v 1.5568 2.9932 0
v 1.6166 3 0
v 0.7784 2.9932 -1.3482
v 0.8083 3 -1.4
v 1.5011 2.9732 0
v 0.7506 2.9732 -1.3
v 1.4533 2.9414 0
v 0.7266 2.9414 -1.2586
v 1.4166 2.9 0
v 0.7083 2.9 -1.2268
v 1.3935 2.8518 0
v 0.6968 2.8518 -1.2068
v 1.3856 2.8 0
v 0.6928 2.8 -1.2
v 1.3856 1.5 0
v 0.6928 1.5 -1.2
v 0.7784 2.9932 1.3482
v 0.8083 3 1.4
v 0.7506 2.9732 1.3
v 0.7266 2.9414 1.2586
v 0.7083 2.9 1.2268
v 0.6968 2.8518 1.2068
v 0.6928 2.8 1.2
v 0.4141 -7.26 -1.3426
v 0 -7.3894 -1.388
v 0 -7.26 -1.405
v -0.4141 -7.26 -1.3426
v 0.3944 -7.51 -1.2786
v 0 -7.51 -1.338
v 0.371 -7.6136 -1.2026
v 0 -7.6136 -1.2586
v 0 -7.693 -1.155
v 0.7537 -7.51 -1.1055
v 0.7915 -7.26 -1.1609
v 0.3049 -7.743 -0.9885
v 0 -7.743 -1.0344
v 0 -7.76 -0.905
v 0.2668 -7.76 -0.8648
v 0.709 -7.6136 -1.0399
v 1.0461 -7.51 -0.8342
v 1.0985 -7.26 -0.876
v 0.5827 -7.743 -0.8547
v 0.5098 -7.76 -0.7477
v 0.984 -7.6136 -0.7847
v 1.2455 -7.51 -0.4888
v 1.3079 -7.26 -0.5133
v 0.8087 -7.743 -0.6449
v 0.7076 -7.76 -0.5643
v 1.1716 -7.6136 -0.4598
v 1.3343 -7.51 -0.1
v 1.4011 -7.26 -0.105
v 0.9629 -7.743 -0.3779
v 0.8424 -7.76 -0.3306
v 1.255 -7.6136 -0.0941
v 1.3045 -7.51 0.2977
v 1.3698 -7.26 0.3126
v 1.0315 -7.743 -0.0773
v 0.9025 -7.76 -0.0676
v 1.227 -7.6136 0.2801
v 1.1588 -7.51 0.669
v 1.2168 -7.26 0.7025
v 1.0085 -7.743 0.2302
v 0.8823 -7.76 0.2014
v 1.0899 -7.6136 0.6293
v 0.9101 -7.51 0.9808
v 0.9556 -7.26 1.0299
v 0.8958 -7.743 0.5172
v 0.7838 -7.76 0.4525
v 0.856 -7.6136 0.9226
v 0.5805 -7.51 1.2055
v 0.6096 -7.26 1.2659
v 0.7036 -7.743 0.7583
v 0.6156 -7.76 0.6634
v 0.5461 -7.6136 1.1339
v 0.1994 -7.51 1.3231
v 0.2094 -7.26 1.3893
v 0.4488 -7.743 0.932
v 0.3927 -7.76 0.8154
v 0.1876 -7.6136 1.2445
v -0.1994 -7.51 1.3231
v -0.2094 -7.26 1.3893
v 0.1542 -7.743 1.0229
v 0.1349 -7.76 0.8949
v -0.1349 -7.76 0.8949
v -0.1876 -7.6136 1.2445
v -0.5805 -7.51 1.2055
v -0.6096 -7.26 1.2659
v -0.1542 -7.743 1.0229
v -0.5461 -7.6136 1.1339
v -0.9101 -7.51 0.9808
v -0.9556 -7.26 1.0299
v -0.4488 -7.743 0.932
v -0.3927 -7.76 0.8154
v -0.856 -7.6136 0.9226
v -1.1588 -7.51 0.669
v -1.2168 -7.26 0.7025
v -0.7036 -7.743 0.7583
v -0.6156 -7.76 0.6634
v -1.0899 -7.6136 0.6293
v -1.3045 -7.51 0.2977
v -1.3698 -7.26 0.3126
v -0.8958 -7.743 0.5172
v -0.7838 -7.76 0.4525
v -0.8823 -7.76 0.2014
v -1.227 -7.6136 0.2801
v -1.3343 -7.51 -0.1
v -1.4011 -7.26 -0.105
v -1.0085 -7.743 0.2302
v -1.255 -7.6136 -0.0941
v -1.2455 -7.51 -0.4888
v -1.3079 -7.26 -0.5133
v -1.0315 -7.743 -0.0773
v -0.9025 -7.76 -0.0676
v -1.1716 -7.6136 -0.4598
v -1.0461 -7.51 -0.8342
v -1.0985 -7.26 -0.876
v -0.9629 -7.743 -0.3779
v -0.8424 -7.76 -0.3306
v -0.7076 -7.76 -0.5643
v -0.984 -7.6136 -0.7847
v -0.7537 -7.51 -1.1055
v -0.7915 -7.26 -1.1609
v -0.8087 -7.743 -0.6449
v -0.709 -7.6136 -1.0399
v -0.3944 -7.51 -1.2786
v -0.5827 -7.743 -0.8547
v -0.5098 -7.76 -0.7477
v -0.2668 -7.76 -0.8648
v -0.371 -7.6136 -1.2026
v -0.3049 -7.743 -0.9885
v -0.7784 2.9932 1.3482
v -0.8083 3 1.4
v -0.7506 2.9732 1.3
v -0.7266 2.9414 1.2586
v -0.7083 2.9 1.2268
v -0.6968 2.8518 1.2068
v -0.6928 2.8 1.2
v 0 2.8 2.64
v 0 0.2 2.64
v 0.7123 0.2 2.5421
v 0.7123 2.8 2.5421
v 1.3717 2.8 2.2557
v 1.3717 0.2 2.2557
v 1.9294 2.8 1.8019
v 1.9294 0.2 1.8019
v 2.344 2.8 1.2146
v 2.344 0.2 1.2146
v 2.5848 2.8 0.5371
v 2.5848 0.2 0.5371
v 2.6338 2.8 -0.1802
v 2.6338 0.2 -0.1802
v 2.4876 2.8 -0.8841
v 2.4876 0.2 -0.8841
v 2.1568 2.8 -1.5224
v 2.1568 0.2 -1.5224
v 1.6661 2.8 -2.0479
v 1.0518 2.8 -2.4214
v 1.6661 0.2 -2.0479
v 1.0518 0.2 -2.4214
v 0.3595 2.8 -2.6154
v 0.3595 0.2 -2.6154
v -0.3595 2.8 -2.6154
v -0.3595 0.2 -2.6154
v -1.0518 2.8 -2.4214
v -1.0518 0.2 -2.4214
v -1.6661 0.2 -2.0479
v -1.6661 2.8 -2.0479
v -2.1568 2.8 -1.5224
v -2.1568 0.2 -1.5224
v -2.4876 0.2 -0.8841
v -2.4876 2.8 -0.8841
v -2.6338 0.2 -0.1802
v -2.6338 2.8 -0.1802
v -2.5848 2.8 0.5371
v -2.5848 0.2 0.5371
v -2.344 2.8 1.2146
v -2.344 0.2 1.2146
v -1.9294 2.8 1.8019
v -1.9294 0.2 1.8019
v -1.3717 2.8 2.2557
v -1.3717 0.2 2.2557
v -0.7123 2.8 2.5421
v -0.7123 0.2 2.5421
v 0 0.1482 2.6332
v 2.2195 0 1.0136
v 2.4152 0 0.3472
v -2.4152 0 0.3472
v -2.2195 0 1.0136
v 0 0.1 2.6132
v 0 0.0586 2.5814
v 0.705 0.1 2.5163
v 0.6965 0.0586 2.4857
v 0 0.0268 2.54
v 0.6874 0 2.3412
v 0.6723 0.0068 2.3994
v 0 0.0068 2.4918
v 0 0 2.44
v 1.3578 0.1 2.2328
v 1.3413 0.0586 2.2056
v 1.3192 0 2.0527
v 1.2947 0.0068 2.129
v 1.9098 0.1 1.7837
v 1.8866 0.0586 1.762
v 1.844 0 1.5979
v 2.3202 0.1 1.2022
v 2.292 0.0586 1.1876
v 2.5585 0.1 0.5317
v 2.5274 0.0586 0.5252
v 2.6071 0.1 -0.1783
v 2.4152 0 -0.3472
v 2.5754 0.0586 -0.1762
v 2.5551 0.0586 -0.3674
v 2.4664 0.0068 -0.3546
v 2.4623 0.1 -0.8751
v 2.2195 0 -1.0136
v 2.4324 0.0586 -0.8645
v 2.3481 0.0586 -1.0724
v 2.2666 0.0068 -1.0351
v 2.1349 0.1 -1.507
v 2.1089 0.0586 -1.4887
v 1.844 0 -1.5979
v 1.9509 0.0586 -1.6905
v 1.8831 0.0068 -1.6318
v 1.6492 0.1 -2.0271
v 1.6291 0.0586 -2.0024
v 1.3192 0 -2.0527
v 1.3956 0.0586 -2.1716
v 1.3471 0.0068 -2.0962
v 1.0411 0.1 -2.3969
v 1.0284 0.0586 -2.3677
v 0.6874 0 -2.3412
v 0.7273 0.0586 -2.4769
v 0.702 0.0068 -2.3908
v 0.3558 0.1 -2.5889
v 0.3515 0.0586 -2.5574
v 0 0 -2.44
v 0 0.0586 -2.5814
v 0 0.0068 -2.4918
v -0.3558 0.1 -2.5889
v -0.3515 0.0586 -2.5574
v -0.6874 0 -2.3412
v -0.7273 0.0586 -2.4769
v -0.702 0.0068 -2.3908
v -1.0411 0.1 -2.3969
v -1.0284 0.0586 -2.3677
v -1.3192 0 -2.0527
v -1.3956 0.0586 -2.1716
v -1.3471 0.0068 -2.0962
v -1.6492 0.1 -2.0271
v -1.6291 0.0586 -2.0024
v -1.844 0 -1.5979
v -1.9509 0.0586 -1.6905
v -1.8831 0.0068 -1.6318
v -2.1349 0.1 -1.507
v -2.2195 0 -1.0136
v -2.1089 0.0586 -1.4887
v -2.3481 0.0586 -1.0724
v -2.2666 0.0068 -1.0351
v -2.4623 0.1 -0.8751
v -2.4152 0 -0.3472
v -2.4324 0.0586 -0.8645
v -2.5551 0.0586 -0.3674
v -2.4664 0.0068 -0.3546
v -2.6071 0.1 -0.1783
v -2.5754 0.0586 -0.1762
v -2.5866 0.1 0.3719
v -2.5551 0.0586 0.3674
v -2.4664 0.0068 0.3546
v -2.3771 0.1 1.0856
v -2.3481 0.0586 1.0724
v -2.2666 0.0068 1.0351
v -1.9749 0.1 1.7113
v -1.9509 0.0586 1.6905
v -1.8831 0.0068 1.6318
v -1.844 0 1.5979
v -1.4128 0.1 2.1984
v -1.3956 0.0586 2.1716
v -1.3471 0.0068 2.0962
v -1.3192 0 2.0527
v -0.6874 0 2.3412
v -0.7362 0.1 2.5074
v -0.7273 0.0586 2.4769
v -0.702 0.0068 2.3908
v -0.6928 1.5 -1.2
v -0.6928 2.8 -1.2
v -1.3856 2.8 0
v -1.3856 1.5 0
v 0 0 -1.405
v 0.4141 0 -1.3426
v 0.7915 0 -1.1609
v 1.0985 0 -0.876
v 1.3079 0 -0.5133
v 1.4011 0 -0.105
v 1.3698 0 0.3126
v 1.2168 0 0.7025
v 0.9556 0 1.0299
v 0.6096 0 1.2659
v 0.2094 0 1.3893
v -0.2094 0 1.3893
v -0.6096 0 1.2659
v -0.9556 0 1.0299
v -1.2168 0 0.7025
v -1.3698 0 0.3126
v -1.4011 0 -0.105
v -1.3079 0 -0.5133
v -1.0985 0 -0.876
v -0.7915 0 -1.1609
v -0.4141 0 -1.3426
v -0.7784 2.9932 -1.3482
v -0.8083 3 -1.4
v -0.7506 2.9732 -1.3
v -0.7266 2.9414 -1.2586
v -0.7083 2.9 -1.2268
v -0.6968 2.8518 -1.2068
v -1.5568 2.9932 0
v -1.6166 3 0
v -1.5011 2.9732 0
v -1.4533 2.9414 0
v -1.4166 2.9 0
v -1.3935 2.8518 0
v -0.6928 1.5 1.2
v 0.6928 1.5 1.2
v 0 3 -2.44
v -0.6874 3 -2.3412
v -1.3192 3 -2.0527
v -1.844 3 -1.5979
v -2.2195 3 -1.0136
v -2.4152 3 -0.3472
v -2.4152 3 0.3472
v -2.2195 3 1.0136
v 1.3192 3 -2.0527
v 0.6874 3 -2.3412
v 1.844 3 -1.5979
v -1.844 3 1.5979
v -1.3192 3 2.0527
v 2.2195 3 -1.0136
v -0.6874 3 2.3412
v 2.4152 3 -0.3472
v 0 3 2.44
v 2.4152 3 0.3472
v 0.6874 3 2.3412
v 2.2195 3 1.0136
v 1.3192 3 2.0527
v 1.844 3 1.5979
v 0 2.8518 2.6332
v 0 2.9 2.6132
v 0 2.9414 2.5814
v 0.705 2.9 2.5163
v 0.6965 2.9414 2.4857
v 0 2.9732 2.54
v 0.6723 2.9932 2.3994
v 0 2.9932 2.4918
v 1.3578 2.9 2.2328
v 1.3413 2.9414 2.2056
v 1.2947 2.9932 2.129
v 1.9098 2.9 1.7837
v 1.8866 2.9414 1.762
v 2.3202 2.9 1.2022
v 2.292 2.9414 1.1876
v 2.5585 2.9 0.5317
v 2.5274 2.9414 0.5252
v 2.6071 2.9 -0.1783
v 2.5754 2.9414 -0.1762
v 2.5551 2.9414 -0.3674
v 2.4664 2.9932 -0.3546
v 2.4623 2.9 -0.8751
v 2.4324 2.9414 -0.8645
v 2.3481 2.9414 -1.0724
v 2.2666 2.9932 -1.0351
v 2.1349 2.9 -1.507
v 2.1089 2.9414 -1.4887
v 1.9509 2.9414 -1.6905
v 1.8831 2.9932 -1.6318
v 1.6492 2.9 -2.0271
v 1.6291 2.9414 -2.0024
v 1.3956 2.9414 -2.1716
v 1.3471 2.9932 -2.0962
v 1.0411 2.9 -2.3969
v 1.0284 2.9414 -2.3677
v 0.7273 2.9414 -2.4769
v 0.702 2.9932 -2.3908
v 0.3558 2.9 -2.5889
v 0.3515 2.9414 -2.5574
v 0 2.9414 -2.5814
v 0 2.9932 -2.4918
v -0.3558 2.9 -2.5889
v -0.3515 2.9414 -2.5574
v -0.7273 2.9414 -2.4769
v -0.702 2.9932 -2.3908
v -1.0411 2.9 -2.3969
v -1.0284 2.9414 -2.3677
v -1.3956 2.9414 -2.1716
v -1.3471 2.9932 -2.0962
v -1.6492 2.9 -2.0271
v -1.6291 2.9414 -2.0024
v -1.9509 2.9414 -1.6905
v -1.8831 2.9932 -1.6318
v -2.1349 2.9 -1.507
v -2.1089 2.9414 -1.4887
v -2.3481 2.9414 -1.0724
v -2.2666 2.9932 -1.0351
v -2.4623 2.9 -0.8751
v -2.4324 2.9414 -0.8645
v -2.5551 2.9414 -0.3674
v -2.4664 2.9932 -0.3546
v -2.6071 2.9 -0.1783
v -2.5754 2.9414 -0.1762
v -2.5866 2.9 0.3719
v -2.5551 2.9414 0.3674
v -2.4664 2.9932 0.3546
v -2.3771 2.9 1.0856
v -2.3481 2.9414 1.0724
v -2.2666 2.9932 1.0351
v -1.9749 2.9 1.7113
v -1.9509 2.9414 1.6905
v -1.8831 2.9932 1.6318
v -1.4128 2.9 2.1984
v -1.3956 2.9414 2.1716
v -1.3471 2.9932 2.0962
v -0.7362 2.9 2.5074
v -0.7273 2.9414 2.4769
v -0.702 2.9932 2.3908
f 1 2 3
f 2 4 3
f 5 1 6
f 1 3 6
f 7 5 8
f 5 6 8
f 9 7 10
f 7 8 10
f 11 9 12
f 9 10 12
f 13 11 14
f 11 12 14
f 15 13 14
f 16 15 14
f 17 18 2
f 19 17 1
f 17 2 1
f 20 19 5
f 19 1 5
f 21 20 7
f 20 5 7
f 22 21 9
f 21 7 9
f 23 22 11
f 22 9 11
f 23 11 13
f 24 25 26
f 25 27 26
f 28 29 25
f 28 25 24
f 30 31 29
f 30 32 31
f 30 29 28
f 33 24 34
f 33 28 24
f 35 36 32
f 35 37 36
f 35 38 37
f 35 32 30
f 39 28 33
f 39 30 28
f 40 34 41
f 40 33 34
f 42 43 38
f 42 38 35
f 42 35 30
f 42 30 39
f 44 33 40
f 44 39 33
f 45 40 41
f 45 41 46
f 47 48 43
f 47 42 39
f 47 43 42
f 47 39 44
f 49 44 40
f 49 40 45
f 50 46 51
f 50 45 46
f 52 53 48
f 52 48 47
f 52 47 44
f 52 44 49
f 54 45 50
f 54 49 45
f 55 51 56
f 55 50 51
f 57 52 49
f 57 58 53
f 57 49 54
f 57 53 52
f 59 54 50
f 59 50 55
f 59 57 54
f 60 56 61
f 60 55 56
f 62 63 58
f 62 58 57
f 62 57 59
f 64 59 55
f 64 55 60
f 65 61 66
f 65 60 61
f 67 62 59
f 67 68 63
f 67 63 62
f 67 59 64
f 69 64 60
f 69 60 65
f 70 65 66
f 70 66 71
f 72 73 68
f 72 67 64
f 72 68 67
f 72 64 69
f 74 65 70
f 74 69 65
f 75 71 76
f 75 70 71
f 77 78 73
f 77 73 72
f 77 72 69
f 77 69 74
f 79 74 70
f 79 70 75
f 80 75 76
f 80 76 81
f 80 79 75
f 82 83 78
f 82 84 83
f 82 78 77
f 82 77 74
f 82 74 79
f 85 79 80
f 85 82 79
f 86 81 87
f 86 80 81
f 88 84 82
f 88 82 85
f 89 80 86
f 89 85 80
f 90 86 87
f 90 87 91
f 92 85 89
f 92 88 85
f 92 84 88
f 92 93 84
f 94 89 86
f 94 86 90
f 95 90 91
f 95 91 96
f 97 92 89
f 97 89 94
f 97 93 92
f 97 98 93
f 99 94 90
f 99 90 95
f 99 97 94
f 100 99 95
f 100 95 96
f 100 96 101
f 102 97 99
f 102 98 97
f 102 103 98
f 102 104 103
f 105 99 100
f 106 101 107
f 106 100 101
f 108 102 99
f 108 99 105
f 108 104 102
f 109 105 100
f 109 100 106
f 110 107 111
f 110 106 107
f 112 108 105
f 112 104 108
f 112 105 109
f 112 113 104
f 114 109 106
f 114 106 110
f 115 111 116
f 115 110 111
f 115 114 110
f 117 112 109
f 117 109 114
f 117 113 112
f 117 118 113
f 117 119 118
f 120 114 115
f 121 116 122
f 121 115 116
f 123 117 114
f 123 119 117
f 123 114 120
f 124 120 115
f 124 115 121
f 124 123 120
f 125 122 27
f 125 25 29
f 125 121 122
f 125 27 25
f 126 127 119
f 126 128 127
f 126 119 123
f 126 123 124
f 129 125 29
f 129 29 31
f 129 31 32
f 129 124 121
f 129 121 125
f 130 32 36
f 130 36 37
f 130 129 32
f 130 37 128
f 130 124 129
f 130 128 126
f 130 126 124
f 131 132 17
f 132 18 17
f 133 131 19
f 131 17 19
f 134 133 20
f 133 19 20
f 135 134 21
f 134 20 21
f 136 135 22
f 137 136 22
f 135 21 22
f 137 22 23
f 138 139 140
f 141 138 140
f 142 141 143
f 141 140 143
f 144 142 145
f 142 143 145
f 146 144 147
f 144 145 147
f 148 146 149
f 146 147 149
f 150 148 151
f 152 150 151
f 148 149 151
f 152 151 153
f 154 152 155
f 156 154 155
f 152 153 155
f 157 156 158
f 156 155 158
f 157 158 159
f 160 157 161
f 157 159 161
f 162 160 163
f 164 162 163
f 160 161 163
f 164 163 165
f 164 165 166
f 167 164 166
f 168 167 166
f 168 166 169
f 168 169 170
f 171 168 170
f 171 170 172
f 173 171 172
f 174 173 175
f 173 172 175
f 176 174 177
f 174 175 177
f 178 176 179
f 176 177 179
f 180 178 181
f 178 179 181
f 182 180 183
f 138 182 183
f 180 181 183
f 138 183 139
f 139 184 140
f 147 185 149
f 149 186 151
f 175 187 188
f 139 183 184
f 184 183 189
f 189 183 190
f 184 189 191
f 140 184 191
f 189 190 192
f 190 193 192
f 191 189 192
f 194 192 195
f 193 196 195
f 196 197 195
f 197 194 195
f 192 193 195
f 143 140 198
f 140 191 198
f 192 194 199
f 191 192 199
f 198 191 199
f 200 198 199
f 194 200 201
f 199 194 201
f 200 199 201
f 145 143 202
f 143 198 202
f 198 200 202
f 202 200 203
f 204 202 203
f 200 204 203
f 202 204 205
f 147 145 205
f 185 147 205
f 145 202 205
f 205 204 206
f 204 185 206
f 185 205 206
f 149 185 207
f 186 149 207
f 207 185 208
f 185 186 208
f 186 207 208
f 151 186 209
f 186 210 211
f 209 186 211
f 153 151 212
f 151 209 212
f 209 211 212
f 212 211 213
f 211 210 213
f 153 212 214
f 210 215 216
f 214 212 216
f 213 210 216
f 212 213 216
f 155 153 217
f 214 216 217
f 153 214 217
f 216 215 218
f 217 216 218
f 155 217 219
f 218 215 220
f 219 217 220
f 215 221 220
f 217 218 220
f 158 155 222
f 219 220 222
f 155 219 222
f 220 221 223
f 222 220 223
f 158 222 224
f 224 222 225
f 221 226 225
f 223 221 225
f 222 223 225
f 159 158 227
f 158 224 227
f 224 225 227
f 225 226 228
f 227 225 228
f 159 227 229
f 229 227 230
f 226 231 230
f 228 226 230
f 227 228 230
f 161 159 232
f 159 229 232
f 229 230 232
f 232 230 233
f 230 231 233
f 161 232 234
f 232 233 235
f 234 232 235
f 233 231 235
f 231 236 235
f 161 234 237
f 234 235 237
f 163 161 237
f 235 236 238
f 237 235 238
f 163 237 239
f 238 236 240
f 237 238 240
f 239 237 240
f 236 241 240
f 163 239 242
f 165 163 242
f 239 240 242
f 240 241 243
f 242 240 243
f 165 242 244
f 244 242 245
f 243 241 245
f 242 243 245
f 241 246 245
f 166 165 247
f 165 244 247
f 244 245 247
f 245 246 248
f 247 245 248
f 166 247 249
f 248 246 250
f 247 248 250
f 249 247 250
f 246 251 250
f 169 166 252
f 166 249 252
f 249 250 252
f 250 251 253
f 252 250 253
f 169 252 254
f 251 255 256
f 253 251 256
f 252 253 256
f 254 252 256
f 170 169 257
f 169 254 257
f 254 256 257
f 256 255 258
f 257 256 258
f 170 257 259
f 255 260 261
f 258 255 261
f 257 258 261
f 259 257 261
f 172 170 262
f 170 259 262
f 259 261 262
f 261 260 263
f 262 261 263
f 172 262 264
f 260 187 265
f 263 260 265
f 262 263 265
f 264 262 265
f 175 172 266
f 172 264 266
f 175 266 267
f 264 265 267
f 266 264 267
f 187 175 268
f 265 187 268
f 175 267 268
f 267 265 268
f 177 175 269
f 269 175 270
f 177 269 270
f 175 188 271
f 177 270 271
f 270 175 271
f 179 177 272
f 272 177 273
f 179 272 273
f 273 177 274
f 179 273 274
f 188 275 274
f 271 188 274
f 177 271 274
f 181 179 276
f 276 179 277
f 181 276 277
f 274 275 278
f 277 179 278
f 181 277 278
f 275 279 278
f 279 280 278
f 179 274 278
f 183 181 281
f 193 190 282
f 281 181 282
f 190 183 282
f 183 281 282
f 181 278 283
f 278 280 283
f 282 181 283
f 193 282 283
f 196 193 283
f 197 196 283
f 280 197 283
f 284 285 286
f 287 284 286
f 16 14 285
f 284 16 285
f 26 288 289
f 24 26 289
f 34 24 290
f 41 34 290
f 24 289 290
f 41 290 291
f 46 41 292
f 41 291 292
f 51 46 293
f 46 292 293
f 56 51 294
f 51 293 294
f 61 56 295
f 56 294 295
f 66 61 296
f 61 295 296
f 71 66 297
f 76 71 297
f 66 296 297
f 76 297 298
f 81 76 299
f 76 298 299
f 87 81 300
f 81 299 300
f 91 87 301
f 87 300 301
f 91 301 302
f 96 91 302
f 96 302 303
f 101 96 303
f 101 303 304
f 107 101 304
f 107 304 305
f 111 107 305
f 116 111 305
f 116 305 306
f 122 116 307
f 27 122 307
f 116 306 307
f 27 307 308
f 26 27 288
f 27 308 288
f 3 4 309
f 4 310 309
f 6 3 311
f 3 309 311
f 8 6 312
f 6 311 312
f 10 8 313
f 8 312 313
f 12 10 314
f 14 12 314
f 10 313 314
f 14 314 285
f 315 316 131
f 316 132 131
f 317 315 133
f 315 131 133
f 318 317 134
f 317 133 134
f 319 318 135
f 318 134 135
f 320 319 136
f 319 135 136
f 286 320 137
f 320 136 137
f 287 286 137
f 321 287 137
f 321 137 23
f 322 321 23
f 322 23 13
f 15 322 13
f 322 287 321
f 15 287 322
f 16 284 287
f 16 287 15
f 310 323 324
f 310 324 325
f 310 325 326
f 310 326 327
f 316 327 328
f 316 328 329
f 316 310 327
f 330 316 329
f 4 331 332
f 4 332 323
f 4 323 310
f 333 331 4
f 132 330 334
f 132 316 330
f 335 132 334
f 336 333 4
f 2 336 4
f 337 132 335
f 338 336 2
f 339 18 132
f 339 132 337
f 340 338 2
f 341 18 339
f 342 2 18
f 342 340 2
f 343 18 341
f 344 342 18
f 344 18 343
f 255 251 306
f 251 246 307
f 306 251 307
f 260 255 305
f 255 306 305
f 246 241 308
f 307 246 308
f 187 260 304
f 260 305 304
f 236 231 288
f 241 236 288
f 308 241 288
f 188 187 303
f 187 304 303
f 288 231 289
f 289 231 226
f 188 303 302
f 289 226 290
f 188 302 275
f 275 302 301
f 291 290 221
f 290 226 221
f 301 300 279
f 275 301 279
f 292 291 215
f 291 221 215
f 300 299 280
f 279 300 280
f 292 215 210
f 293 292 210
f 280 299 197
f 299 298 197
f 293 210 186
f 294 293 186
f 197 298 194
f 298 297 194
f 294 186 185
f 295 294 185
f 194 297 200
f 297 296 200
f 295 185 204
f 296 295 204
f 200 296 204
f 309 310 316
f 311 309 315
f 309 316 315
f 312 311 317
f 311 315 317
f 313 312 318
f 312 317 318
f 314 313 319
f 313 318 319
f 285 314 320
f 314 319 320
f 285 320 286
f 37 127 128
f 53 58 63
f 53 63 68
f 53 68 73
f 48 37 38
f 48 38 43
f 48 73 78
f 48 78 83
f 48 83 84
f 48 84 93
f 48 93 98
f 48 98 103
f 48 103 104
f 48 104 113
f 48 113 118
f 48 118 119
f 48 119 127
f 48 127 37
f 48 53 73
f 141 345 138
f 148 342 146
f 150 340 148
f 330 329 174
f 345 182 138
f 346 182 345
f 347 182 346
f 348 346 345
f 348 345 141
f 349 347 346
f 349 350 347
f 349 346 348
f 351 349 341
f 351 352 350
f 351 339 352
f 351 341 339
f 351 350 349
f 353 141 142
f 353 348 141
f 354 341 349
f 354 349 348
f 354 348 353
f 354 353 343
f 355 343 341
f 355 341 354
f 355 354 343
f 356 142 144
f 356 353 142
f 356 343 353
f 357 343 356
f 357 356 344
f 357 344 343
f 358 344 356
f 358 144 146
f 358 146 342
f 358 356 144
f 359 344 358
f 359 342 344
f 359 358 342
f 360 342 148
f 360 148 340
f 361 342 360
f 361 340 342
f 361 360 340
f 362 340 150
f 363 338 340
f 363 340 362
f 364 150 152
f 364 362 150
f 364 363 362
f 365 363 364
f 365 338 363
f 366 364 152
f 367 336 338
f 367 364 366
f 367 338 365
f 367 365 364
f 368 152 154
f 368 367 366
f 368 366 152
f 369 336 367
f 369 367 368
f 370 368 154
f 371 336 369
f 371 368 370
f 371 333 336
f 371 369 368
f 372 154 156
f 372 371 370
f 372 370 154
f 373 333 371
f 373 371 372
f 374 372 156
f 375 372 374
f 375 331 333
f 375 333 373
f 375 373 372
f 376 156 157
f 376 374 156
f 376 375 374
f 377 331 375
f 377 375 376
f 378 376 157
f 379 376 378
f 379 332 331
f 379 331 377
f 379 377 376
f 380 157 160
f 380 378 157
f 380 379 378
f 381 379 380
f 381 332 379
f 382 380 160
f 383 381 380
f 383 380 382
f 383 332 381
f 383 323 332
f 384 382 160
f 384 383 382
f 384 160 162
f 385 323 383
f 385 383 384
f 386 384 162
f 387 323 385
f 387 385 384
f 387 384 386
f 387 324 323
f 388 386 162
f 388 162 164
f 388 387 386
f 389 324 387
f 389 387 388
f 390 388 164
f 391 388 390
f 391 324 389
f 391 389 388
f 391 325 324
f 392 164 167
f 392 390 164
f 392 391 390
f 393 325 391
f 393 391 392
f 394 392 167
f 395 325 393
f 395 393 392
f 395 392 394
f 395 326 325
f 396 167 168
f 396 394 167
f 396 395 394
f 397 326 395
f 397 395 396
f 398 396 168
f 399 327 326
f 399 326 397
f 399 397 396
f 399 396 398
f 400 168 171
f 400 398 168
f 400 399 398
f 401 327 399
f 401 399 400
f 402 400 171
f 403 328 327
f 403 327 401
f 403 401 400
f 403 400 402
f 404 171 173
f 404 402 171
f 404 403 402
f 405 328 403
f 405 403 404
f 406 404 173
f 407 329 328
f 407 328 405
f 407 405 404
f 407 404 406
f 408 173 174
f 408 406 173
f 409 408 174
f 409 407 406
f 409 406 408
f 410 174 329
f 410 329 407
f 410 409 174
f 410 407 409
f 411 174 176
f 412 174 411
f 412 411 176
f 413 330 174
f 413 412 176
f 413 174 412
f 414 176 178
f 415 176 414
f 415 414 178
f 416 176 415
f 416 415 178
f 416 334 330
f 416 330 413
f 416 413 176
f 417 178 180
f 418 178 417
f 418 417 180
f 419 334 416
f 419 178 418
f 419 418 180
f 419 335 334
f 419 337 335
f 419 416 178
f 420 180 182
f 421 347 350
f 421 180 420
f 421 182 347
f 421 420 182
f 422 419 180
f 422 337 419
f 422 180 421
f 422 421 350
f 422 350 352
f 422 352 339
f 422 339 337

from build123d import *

# Parameters (mm, degrees)
SKETCH1_R           = 2.64
BOSS_EXTRUDE1_DEPTH = 3
SKETCH2_R           = 1.405
BOSS_EXTRUDE2_DEPTH = 7.76
FILLET1_R           = 0.2
CUT_EXTRUDE1_DEPTH  = 1.5
FILLET2_R           = 0.2
FILLET3_R           = 0.5


with BuildPart() as part:
    # Sketch1 → Boss-Extrude1 (new body)
    with BuildSketch(Plane(origin=(0, 0, 0), x_dir=(1, 0, 0), z_dir=(0, 1, 0))):
        with Locations(Location((0, 0, 0), (0, 0, 270))):
            Circle(SKETCH1_R)
    extrude(amount=BOSS_EXTRUDE1_DEPTH)

    # Sketch2 → Boss-Extrude2 (add)
    with BuildSketch(Plane.XZ):
        with Locations(Location((0, 0, 0), (0, 0, 270))):
            Circle(SKETCH2_R)
    extrude(amount=BOSS_EXTRUDE2_DEPTH)

    # Fillet1
    fillet1_edges = [part.edges().sort_by_distance(p)[0] for p in [
        (0, 0, -2.64),
        (0, 3, -2.64),
    ]]
    fillet(fillet1_edges, radius=FILLET1_R)

    # Sketch3 → Cut-Extrude1 (cut)
    with BuildSketch(Plane(origin=(0, 3, 0), x_dir=(1, 0, 0), z_dir=(0, 1, 0))):
        Polygon((1.385640646, 0), (0.692820323, 1.2), (-0.692820323, 1.2), (-1.385640646, 0), (-0.692820323, -1.2), (0.692820323, -1.2), align=None)
    extrude(amount=-CUT_EXTRUDE1_DEPTH, mode=Mode.SUBTRACT)

    # Fillet2
    fillet2_edges = [part.edges().sort_by_distance(p)[0] for p in [
        (1.039230485, 3, 0.6),
        (1.039230485, 3, -0.6),
        (0, 3, -1.2),
        (-1.039230485, 3, -0.6),
        (-1.039230485, 3, 0.6),
        (0, 3, 1.2),
    ]]
    fillet(fillet2_edges, radius=FILLET2_R)

    # Fillet3
    fillet3_edges = [part.edges().sort_by_distance(p)[0] for p in [
        (0, -7.76, 1.405),
    ]]
    fillet(fillet3_edges, radius=FILLET3_R)


solid = part.part
